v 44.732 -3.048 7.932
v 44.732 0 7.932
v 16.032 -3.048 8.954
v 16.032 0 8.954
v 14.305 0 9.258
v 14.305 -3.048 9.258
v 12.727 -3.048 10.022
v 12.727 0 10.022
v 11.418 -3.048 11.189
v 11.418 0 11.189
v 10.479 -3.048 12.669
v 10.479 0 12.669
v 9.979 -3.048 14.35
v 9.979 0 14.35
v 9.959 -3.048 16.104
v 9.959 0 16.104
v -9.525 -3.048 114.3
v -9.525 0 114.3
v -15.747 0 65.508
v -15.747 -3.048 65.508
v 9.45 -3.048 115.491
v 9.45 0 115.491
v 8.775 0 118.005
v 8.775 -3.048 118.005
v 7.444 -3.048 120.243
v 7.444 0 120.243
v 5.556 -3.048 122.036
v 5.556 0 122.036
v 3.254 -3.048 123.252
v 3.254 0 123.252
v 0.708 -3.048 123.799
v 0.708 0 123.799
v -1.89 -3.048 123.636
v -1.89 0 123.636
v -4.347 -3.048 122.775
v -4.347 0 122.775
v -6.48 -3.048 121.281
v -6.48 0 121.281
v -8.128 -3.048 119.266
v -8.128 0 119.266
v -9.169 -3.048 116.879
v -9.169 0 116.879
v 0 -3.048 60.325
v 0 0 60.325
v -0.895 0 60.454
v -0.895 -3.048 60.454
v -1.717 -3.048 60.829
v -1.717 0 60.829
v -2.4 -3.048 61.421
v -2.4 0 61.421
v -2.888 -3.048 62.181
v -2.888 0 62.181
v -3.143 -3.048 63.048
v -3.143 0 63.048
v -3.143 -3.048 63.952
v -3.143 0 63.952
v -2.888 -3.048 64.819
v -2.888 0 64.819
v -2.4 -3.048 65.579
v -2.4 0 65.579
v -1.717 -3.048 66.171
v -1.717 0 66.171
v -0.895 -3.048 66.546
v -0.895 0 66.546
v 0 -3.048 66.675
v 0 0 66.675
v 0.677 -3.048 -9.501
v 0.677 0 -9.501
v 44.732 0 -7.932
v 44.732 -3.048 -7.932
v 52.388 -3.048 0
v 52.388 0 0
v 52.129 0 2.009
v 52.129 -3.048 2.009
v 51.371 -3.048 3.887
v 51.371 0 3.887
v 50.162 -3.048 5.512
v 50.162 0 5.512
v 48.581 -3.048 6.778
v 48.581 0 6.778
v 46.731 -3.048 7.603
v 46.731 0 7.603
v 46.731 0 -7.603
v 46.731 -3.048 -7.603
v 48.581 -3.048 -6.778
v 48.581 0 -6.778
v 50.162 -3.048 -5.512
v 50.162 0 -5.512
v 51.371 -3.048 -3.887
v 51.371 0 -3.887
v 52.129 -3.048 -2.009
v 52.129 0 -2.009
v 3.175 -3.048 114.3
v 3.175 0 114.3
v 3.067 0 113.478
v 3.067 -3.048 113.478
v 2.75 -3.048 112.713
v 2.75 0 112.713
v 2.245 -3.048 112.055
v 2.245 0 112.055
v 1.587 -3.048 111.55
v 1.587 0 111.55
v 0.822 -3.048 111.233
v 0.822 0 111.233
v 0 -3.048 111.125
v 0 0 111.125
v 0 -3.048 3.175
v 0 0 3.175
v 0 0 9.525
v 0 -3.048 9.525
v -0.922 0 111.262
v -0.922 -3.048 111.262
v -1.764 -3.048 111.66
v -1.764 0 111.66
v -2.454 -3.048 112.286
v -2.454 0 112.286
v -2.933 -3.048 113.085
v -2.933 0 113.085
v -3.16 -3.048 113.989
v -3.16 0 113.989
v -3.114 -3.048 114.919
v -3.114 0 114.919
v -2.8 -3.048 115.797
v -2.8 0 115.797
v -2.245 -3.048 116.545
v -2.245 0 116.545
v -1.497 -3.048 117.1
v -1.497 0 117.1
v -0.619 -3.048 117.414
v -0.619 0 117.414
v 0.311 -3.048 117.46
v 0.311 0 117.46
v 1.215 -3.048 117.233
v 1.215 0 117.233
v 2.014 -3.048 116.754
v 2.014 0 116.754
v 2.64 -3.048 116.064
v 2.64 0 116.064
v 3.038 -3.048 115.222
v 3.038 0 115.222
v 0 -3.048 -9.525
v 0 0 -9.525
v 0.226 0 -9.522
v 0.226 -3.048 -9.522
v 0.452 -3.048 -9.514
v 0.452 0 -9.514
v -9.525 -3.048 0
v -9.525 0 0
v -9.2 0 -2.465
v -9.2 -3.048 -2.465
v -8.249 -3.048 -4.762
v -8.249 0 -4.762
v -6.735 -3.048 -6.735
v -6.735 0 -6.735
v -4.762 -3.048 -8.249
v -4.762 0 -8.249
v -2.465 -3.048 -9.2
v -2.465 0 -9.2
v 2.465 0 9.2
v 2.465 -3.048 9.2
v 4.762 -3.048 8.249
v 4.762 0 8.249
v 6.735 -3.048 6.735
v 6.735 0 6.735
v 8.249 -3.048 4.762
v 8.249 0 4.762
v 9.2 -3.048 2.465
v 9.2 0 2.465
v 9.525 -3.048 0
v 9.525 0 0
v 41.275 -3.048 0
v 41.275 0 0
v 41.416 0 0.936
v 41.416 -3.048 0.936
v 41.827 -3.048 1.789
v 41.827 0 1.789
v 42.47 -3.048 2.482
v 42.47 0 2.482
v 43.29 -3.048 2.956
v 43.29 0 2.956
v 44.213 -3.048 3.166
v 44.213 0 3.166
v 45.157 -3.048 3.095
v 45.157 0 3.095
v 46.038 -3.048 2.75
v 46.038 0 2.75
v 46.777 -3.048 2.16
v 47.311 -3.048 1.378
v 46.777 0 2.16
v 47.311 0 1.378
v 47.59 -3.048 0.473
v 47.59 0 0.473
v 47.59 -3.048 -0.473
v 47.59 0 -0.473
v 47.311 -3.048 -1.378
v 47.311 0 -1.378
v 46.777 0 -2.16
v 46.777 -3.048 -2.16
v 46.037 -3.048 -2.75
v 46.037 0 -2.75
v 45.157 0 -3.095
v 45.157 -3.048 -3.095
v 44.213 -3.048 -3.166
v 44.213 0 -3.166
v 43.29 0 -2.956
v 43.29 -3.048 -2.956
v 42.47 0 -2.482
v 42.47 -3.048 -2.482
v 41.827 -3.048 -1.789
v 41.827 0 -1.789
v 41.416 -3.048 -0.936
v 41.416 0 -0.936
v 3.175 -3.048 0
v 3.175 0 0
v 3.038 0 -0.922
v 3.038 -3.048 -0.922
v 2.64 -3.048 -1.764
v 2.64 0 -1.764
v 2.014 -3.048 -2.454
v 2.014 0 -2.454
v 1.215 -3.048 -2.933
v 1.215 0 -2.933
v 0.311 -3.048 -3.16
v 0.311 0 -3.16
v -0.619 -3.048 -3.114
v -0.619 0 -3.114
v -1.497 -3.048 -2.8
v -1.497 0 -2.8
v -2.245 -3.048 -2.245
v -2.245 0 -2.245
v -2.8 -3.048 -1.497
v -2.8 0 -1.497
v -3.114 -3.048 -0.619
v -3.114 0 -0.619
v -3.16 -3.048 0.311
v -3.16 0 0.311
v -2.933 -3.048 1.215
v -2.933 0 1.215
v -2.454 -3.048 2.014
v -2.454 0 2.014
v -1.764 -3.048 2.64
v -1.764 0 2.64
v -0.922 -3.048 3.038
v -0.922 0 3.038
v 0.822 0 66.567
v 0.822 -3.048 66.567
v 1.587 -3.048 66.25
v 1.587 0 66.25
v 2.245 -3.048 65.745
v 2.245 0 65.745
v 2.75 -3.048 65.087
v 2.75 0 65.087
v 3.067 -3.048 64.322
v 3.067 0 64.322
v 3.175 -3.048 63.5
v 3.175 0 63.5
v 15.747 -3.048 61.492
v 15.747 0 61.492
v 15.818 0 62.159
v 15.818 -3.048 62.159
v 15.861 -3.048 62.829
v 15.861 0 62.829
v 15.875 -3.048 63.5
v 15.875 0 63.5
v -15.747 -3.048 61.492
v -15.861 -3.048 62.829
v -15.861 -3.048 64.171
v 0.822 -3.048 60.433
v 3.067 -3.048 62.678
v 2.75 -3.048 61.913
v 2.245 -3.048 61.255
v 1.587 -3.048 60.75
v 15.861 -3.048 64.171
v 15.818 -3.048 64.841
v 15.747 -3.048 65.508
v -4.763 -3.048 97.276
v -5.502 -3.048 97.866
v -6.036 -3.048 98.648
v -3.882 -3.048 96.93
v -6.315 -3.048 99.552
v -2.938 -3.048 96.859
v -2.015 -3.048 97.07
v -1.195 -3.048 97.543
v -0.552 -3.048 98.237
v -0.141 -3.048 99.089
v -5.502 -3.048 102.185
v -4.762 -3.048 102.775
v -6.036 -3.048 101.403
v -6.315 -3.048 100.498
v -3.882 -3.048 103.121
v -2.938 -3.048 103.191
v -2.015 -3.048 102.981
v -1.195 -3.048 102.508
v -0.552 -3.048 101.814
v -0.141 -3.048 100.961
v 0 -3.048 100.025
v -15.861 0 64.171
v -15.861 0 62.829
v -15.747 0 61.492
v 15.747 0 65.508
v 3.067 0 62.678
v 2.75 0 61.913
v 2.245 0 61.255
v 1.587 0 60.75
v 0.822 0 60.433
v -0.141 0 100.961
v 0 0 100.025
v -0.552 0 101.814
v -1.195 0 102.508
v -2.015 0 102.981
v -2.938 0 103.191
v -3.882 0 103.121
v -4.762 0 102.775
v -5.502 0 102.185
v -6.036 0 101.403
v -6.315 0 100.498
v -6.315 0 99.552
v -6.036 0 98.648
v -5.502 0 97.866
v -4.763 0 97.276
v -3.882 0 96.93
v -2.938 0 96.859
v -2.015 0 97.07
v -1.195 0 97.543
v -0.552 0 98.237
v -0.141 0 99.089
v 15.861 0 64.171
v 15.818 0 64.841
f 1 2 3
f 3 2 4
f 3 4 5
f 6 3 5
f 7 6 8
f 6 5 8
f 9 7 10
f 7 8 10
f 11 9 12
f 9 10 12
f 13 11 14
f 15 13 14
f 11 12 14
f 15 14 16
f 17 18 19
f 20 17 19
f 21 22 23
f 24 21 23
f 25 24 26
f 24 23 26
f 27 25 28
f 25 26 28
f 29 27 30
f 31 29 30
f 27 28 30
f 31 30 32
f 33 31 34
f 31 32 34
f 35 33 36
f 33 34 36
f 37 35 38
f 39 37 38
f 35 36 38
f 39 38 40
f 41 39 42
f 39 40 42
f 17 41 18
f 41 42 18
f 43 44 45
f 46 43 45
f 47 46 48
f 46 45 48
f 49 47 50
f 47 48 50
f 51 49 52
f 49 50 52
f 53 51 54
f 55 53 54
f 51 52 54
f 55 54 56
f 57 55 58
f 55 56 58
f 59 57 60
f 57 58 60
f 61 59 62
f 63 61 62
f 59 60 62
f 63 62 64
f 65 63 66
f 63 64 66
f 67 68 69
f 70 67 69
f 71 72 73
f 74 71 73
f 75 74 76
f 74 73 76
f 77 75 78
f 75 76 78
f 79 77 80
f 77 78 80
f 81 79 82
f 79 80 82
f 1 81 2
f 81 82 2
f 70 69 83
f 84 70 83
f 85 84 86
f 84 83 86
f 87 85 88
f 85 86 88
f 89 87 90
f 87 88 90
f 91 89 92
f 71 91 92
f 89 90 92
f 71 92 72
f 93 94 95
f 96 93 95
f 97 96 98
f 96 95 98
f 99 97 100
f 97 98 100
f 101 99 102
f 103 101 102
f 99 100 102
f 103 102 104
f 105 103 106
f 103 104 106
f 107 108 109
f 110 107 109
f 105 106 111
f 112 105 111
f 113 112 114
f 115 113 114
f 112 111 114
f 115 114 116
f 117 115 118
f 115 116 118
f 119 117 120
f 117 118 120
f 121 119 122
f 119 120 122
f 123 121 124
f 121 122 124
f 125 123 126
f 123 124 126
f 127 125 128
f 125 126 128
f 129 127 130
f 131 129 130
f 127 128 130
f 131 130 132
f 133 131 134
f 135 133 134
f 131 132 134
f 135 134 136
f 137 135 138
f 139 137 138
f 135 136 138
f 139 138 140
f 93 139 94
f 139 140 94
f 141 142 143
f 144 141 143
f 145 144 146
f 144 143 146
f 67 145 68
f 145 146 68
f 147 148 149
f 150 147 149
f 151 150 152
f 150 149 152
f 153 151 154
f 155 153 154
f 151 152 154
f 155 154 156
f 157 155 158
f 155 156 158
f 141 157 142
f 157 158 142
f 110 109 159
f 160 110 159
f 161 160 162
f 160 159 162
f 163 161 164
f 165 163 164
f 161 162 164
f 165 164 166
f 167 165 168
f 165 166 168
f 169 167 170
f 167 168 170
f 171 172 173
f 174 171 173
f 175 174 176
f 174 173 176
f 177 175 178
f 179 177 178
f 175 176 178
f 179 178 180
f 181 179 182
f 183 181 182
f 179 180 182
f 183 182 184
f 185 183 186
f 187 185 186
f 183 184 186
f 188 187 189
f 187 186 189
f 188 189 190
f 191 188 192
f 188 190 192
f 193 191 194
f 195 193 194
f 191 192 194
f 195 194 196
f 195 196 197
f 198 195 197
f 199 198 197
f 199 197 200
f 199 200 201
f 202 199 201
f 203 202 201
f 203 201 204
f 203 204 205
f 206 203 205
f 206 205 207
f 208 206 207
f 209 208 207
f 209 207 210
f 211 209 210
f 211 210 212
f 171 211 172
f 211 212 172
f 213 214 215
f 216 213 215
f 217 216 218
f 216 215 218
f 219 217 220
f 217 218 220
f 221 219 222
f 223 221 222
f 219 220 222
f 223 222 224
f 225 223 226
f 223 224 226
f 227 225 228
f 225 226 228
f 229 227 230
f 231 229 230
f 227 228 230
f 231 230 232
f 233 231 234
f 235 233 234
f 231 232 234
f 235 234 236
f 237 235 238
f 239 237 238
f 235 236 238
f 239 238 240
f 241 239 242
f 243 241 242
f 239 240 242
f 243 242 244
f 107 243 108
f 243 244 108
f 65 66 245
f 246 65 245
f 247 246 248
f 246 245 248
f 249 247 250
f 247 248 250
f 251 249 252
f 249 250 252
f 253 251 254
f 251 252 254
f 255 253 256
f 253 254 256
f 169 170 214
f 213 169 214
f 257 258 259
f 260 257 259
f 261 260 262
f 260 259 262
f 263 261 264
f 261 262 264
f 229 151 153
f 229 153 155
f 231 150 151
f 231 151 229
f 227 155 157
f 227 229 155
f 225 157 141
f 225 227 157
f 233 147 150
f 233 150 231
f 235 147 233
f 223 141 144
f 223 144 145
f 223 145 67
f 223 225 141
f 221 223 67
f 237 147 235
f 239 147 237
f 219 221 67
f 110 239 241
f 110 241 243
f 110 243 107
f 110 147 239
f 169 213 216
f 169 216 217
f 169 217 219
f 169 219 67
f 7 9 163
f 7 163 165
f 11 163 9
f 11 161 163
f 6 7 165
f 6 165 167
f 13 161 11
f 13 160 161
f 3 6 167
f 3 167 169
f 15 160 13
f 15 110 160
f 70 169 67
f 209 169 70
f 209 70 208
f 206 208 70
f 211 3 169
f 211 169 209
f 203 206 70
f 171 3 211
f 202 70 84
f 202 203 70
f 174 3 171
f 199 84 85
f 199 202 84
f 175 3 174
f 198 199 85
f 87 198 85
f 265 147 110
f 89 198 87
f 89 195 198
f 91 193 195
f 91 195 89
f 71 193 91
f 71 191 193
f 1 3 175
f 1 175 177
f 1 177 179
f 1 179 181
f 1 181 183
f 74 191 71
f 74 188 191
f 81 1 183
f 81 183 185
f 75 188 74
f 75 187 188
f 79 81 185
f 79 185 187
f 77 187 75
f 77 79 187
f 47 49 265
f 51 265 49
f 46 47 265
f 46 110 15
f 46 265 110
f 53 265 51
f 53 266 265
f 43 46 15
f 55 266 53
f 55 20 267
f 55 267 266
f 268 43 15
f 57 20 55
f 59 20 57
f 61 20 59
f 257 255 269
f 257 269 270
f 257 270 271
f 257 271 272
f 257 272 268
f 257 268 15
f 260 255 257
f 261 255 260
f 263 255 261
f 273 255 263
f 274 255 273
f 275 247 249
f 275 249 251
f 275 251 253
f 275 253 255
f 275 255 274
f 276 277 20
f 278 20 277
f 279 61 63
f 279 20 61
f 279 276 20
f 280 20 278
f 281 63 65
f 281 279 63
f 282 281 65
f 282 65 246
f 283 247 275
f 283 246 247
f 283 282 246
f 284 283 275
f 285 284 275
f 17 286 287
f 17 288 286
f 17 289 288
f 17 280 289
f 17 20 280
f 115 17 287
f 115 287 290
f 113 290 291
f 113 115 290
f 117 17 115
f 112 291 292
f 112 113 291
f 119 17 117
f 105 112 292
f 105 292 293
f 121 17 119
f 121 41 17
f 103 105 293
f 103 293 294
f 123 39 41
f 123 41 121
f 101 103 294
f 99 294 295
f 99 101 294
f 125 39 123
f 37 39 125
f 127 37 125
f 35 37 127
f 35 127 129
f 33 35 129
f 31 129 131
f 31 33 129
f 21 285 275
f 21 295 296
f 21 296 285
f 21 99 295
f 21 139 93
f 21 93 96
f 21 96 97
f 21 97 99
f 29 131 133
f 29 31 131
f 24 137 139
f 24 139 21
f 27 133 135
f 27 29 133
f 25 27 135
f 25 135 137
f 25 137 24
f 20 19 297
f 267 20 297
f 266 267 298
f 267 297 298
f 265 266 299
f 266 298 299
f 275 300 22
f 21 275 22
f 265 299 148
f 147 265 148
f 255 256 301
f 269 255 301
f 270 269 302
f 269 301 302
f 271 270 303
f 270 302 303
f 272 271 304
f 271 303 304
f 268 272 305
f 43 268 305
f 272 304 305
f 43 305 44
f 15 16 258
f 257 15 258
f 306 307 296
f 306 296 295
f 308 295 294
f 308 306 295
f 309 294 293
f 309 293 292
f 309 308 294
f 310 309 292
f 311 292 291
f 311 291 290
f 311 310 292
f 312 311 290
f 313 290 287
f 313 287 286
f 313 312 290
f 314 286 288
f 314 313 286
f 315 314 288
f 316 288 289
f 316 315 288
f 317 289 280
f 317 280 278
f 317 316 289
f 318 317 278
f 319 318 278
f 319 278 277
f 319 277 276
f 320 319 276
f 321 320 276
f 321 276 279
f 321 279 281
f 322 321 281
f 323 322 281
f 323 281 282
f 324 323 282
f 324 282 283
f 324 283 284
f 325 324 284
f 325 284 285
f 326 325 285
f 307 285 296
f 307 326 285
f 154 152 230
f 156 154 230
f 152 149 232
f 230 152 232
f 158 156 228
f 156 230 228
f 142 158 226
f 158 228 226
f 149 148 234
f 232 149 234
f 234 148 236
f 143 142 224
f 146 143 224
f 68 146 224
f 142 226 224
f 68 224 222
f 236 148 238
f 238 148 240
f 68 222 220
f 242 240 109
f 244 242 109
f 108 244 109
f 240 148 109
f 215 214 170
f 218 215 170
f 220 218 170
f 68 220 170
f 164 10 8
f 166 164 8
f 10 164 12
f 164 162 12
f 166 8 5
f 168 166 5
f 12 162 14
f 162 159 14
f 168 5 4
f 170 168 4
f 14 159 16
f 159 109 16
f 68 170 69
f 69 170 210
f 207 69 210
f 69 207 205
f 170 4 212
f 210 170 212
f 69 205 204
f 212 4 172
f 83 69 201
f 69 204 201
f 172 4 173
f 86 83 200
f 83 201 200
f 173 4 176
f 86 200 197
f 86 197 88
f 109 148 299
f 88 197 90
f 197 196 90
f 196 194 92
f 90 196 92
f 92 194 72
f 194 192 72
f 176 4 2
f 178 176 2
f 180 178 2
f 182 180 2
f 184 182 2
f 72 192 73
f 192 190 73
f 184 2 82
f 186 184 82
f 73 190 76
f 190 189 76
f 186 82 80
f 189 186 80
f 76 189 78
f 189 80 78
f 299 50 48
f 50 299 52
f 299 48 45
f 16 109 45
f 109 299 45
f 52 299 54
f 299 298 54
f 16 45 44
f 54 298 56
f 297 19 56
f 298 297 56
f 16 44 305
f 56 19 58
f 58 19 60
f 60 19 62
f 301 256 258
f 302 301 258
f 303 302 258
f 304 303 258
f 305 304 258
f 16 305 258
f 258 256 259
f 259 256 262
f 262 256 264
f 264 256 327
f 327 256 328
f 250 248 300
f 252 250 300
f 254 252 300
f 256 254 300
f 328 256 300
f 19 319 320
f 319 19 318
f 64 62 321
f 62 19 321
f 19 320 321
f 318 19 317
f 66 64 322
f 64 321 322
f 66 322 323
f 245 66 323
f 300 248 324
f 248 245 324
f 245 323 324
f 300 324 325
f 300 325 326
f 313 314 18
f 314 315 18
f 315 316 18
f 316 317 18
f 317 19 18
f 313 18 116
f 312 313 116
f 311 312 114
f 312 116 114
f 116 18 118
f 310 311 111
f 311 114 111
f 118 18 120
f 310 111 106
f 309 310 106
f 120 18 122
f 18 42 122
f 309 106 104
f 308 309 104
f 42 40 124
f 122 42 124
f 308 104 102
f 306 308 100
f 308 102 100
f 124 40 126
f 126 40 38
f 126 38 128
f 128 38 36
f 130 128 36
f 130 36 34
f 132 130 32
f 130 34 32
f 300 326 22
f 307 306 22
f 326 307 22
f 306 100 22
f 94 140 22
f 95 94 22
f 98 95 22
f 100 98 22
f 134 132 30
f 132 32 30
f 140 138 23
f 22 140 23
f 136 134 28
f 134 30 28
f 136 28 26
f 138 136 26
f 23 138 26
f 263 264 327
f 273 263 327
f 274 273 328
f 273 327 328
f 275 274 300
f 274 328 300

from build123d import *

# Parameters (mm, degrees)
F0_R     = 3.175
F1_DEPTH = 3.048


with BuildPart() as f1:
    # F0 (on Front) → F1 (new body)
    with BuildSketch(Plane.XZ):
        with BuildLine():
            ThreePointArc((3.175, 114.3), (-2.245064, 116.545064), (0, 111.125))
            ThreePointArc((0, 111.125), (2.245064, 112.054936), (3.175, 114.3))
        make_face()
        with BuildLine():
            ThreePointArc((0, 104.775), (6.735192, 107.564808), (9.525, 114.3))
            ThreePointArc((9.525, 114.3), (9.506305, 114.896482), (9.450293, 115.490622))
            ThreePointArc((9.450293, 115.490622), (-0.596482, 123.806305), (-9.525, 114.3))
            ThreePointArc((-9.525, 114.3), (-6.735192, 107.564808), (0, 104.775))
        make_face()
        with BuildLine():
            ThreePointArc((3.175, 114.3), (2.245064, 112.054936), (0, 111.125))
            ThreePointArc((0, 111.125), (-2.245064, 116.545064), (3.175, 114.3))
        make_face(mode=Mode.SUBTRACT)
        with BuildLine():
            ThreePointArc((9.450293, 115.490622), (9.506305, 114.896482), (9.525, 114.3))
            ThreePointArc((9.525, 114.3), (6.735192, 107.564808), (0, 104.775))
            Line((0, 104.775), (0, 100.0252))
            Line((0, 100.0252), (0, 79.375))
            ThreePointArc((0, 79.375), (10.491283, 75.414219), (15.747457, 65.508289))
            Line((15.747457, 65.508289), (9.450293, 115.490622))
        make_face()
        with BuildLine():
            Line((0, 100.0252), (0, 104.775))
            ThreePointArc((0, 104.775), (-6.735192, 107.564808), (-9.525, 114.3))
            Line((-9.525, 114.3), (-15.747457, 65.508289))
            ThreePointArc((-15.747457, 65.508289), (-10.491283, 75.414219), (0, 79.375))
            Line((0, 79.375), (0, 100.0252))
        make_face()
        with Locations((-3.175, 100.0252)):
            Circle(F0_R, mode=Mode.SUBTRACT)
        with BuildLine():
            ThreePointArc((15.875, 63.5), (15.843082, 64.506168), (15.747457, 65.508289))
            ThreePointArc((15.747457, 65.508289), (10.491283, 75.414219), (0, 79.375))
            Line((0, 79.375), (0, 66.675))
            ThreePointArc((0, 66.675), (2.245064, 65.745064), (3.175, 63.5))
            ThreePointArc((3.175, 63.5), (2.245064, 61.254936), (0, 60.325))
            Line((0, 60.325), (0, 47.625))
            ThreePointArc((0, 47.625), (10.491283, 51.585781), (15.747457, 61.491711))
            ThreePointArc((15.747457, 61.491711), (15.843082, 62.493832), (15.875, 63.5))
        make_face()
        with BuildLine():
            ThreePointArc((0, 79.375), (-10.491283, 75.414219), (-15.747457, 65.508289))
            ThreePointArc((-15.747457, 65.508289), (-15.875, 63.5), (-15.747457, 61.491711))
            ThreePointArc((-15.747457, 61.491711), (-10.491283, 51.585781), (0, 47.625))
            Line((0, 47.625), (0, 60.325))
            ThreePointArc((0, 60.325), (-3.175, 63.5), (0, 66.675))
            Line((0, 66.675), (0, 79.375))
        make_face()
        with BuildLine():
            ThreePointArc((0, 47.625), (-10.491283, 51.585781), (-15.747457, 61.491711))
            Line((-15.747457, 61.491711), (-9.525, 0))
            ThreePointArc((-9.525, 0), (-6.735192, 6.735192), (0, 9.525))
            Line((0, 9.525), (0, 47.625))
        make_face()
        with BuildLine():
            Line((9.959056, 16.103534), (15.747457, 61.491711))
            ThreePointArc((15.747457, 61.491711), (10.491283, 51.585781), (0, 47.625))
            Line((0, 47.625), (0, 9.525))
            ThreePointArc((0, 9.525), (6.735192, 6.735192), (9.525, 0))
            Line((9.525, 0), (36.5125, 0))
            ThreePointArc((36.5125, 0), (38.93809, 5.711633), (44.732405, 7.932475))
            Line((44.732405, 7.932475), (16.032115, 8.954238))
            ThreePointArc((16.032115, 8.954238), (11.418441, 11.189161), (9.959056, 16.103534))
        make_face()
        with BuildLine():
            ThreePointArc((0, 9.525), (-6.735192, 6.735192), (-9.525, 0))
            ThreePointArc((-9.525, 0), (-6.735192, -6.735192), (0, -9.525))
            Line((0, -9.525), (0.677344, -9.500886))
            ThreePointArc((0.677344, -9.500886), (6.970557, -6.491299), (9.525, 0))
            Line((9.525, 0), (3.175, 0))
            ThreePointArc((3.175, 0), (-2.245064, -2.245064), (0, 3.175))
            Line((0, 3.175), (0, 9.525))
        make_face()
        with BuildLine():
            Line((0.677344, -9.500886), (0, -9.525))
            ThreePointArc((0, -9.525), (0.338886, -9.51897), (0.677344, -9.500886))
        make_face()
        with BuildLine():
            Line((36.5125, 0), (9.525, 0))
            ThreePointArc((9.525, 0), (6.970557, -6.491299), (0.677344, -9.500886))
            Line((0.677344, -9.500886), (44.732405, -7.932475))
            ThreePointArc((44.732405, -7.932475), (38.93809, -5.711633), (36.5125, 0))
        make_face()
        with BuildLine():
            ThreePointArc((47.625, 0), (44.45, 3.175), (41.275, 0))
            ThreePointArc((41.275, 0), (44.45, -3.175), (47.625, 0))
        make_face()
        with BuildLine():
            ThreePointArc((52.3875, 0), (50.161633, 5.51191), (44.732405, 7.932475))
            ThreePointArc((44.732405, 7.932475), (38.93809, 5.711633), (36.5125, 0))
            ThreePointArc((36.5125, 0), (38.93809, -5.711633), (44.732405, -7.932475))
            ThreePointArc((44.732405, -7.932475), (50.161633, -5.51191), (52.3875, 0))
        make_face()
        with BuildLine():
            ThreePointArc((47.625, 0), (44.45, -3.175), (41.275, 0))
            ThreePointArc((41.275, 0), (44.45, 3.175), (47.625, 0))
        make_face(mode=Mode.SUBTRACT)
    extrude(amount=F1_DEPTH)


solid = f1.part
